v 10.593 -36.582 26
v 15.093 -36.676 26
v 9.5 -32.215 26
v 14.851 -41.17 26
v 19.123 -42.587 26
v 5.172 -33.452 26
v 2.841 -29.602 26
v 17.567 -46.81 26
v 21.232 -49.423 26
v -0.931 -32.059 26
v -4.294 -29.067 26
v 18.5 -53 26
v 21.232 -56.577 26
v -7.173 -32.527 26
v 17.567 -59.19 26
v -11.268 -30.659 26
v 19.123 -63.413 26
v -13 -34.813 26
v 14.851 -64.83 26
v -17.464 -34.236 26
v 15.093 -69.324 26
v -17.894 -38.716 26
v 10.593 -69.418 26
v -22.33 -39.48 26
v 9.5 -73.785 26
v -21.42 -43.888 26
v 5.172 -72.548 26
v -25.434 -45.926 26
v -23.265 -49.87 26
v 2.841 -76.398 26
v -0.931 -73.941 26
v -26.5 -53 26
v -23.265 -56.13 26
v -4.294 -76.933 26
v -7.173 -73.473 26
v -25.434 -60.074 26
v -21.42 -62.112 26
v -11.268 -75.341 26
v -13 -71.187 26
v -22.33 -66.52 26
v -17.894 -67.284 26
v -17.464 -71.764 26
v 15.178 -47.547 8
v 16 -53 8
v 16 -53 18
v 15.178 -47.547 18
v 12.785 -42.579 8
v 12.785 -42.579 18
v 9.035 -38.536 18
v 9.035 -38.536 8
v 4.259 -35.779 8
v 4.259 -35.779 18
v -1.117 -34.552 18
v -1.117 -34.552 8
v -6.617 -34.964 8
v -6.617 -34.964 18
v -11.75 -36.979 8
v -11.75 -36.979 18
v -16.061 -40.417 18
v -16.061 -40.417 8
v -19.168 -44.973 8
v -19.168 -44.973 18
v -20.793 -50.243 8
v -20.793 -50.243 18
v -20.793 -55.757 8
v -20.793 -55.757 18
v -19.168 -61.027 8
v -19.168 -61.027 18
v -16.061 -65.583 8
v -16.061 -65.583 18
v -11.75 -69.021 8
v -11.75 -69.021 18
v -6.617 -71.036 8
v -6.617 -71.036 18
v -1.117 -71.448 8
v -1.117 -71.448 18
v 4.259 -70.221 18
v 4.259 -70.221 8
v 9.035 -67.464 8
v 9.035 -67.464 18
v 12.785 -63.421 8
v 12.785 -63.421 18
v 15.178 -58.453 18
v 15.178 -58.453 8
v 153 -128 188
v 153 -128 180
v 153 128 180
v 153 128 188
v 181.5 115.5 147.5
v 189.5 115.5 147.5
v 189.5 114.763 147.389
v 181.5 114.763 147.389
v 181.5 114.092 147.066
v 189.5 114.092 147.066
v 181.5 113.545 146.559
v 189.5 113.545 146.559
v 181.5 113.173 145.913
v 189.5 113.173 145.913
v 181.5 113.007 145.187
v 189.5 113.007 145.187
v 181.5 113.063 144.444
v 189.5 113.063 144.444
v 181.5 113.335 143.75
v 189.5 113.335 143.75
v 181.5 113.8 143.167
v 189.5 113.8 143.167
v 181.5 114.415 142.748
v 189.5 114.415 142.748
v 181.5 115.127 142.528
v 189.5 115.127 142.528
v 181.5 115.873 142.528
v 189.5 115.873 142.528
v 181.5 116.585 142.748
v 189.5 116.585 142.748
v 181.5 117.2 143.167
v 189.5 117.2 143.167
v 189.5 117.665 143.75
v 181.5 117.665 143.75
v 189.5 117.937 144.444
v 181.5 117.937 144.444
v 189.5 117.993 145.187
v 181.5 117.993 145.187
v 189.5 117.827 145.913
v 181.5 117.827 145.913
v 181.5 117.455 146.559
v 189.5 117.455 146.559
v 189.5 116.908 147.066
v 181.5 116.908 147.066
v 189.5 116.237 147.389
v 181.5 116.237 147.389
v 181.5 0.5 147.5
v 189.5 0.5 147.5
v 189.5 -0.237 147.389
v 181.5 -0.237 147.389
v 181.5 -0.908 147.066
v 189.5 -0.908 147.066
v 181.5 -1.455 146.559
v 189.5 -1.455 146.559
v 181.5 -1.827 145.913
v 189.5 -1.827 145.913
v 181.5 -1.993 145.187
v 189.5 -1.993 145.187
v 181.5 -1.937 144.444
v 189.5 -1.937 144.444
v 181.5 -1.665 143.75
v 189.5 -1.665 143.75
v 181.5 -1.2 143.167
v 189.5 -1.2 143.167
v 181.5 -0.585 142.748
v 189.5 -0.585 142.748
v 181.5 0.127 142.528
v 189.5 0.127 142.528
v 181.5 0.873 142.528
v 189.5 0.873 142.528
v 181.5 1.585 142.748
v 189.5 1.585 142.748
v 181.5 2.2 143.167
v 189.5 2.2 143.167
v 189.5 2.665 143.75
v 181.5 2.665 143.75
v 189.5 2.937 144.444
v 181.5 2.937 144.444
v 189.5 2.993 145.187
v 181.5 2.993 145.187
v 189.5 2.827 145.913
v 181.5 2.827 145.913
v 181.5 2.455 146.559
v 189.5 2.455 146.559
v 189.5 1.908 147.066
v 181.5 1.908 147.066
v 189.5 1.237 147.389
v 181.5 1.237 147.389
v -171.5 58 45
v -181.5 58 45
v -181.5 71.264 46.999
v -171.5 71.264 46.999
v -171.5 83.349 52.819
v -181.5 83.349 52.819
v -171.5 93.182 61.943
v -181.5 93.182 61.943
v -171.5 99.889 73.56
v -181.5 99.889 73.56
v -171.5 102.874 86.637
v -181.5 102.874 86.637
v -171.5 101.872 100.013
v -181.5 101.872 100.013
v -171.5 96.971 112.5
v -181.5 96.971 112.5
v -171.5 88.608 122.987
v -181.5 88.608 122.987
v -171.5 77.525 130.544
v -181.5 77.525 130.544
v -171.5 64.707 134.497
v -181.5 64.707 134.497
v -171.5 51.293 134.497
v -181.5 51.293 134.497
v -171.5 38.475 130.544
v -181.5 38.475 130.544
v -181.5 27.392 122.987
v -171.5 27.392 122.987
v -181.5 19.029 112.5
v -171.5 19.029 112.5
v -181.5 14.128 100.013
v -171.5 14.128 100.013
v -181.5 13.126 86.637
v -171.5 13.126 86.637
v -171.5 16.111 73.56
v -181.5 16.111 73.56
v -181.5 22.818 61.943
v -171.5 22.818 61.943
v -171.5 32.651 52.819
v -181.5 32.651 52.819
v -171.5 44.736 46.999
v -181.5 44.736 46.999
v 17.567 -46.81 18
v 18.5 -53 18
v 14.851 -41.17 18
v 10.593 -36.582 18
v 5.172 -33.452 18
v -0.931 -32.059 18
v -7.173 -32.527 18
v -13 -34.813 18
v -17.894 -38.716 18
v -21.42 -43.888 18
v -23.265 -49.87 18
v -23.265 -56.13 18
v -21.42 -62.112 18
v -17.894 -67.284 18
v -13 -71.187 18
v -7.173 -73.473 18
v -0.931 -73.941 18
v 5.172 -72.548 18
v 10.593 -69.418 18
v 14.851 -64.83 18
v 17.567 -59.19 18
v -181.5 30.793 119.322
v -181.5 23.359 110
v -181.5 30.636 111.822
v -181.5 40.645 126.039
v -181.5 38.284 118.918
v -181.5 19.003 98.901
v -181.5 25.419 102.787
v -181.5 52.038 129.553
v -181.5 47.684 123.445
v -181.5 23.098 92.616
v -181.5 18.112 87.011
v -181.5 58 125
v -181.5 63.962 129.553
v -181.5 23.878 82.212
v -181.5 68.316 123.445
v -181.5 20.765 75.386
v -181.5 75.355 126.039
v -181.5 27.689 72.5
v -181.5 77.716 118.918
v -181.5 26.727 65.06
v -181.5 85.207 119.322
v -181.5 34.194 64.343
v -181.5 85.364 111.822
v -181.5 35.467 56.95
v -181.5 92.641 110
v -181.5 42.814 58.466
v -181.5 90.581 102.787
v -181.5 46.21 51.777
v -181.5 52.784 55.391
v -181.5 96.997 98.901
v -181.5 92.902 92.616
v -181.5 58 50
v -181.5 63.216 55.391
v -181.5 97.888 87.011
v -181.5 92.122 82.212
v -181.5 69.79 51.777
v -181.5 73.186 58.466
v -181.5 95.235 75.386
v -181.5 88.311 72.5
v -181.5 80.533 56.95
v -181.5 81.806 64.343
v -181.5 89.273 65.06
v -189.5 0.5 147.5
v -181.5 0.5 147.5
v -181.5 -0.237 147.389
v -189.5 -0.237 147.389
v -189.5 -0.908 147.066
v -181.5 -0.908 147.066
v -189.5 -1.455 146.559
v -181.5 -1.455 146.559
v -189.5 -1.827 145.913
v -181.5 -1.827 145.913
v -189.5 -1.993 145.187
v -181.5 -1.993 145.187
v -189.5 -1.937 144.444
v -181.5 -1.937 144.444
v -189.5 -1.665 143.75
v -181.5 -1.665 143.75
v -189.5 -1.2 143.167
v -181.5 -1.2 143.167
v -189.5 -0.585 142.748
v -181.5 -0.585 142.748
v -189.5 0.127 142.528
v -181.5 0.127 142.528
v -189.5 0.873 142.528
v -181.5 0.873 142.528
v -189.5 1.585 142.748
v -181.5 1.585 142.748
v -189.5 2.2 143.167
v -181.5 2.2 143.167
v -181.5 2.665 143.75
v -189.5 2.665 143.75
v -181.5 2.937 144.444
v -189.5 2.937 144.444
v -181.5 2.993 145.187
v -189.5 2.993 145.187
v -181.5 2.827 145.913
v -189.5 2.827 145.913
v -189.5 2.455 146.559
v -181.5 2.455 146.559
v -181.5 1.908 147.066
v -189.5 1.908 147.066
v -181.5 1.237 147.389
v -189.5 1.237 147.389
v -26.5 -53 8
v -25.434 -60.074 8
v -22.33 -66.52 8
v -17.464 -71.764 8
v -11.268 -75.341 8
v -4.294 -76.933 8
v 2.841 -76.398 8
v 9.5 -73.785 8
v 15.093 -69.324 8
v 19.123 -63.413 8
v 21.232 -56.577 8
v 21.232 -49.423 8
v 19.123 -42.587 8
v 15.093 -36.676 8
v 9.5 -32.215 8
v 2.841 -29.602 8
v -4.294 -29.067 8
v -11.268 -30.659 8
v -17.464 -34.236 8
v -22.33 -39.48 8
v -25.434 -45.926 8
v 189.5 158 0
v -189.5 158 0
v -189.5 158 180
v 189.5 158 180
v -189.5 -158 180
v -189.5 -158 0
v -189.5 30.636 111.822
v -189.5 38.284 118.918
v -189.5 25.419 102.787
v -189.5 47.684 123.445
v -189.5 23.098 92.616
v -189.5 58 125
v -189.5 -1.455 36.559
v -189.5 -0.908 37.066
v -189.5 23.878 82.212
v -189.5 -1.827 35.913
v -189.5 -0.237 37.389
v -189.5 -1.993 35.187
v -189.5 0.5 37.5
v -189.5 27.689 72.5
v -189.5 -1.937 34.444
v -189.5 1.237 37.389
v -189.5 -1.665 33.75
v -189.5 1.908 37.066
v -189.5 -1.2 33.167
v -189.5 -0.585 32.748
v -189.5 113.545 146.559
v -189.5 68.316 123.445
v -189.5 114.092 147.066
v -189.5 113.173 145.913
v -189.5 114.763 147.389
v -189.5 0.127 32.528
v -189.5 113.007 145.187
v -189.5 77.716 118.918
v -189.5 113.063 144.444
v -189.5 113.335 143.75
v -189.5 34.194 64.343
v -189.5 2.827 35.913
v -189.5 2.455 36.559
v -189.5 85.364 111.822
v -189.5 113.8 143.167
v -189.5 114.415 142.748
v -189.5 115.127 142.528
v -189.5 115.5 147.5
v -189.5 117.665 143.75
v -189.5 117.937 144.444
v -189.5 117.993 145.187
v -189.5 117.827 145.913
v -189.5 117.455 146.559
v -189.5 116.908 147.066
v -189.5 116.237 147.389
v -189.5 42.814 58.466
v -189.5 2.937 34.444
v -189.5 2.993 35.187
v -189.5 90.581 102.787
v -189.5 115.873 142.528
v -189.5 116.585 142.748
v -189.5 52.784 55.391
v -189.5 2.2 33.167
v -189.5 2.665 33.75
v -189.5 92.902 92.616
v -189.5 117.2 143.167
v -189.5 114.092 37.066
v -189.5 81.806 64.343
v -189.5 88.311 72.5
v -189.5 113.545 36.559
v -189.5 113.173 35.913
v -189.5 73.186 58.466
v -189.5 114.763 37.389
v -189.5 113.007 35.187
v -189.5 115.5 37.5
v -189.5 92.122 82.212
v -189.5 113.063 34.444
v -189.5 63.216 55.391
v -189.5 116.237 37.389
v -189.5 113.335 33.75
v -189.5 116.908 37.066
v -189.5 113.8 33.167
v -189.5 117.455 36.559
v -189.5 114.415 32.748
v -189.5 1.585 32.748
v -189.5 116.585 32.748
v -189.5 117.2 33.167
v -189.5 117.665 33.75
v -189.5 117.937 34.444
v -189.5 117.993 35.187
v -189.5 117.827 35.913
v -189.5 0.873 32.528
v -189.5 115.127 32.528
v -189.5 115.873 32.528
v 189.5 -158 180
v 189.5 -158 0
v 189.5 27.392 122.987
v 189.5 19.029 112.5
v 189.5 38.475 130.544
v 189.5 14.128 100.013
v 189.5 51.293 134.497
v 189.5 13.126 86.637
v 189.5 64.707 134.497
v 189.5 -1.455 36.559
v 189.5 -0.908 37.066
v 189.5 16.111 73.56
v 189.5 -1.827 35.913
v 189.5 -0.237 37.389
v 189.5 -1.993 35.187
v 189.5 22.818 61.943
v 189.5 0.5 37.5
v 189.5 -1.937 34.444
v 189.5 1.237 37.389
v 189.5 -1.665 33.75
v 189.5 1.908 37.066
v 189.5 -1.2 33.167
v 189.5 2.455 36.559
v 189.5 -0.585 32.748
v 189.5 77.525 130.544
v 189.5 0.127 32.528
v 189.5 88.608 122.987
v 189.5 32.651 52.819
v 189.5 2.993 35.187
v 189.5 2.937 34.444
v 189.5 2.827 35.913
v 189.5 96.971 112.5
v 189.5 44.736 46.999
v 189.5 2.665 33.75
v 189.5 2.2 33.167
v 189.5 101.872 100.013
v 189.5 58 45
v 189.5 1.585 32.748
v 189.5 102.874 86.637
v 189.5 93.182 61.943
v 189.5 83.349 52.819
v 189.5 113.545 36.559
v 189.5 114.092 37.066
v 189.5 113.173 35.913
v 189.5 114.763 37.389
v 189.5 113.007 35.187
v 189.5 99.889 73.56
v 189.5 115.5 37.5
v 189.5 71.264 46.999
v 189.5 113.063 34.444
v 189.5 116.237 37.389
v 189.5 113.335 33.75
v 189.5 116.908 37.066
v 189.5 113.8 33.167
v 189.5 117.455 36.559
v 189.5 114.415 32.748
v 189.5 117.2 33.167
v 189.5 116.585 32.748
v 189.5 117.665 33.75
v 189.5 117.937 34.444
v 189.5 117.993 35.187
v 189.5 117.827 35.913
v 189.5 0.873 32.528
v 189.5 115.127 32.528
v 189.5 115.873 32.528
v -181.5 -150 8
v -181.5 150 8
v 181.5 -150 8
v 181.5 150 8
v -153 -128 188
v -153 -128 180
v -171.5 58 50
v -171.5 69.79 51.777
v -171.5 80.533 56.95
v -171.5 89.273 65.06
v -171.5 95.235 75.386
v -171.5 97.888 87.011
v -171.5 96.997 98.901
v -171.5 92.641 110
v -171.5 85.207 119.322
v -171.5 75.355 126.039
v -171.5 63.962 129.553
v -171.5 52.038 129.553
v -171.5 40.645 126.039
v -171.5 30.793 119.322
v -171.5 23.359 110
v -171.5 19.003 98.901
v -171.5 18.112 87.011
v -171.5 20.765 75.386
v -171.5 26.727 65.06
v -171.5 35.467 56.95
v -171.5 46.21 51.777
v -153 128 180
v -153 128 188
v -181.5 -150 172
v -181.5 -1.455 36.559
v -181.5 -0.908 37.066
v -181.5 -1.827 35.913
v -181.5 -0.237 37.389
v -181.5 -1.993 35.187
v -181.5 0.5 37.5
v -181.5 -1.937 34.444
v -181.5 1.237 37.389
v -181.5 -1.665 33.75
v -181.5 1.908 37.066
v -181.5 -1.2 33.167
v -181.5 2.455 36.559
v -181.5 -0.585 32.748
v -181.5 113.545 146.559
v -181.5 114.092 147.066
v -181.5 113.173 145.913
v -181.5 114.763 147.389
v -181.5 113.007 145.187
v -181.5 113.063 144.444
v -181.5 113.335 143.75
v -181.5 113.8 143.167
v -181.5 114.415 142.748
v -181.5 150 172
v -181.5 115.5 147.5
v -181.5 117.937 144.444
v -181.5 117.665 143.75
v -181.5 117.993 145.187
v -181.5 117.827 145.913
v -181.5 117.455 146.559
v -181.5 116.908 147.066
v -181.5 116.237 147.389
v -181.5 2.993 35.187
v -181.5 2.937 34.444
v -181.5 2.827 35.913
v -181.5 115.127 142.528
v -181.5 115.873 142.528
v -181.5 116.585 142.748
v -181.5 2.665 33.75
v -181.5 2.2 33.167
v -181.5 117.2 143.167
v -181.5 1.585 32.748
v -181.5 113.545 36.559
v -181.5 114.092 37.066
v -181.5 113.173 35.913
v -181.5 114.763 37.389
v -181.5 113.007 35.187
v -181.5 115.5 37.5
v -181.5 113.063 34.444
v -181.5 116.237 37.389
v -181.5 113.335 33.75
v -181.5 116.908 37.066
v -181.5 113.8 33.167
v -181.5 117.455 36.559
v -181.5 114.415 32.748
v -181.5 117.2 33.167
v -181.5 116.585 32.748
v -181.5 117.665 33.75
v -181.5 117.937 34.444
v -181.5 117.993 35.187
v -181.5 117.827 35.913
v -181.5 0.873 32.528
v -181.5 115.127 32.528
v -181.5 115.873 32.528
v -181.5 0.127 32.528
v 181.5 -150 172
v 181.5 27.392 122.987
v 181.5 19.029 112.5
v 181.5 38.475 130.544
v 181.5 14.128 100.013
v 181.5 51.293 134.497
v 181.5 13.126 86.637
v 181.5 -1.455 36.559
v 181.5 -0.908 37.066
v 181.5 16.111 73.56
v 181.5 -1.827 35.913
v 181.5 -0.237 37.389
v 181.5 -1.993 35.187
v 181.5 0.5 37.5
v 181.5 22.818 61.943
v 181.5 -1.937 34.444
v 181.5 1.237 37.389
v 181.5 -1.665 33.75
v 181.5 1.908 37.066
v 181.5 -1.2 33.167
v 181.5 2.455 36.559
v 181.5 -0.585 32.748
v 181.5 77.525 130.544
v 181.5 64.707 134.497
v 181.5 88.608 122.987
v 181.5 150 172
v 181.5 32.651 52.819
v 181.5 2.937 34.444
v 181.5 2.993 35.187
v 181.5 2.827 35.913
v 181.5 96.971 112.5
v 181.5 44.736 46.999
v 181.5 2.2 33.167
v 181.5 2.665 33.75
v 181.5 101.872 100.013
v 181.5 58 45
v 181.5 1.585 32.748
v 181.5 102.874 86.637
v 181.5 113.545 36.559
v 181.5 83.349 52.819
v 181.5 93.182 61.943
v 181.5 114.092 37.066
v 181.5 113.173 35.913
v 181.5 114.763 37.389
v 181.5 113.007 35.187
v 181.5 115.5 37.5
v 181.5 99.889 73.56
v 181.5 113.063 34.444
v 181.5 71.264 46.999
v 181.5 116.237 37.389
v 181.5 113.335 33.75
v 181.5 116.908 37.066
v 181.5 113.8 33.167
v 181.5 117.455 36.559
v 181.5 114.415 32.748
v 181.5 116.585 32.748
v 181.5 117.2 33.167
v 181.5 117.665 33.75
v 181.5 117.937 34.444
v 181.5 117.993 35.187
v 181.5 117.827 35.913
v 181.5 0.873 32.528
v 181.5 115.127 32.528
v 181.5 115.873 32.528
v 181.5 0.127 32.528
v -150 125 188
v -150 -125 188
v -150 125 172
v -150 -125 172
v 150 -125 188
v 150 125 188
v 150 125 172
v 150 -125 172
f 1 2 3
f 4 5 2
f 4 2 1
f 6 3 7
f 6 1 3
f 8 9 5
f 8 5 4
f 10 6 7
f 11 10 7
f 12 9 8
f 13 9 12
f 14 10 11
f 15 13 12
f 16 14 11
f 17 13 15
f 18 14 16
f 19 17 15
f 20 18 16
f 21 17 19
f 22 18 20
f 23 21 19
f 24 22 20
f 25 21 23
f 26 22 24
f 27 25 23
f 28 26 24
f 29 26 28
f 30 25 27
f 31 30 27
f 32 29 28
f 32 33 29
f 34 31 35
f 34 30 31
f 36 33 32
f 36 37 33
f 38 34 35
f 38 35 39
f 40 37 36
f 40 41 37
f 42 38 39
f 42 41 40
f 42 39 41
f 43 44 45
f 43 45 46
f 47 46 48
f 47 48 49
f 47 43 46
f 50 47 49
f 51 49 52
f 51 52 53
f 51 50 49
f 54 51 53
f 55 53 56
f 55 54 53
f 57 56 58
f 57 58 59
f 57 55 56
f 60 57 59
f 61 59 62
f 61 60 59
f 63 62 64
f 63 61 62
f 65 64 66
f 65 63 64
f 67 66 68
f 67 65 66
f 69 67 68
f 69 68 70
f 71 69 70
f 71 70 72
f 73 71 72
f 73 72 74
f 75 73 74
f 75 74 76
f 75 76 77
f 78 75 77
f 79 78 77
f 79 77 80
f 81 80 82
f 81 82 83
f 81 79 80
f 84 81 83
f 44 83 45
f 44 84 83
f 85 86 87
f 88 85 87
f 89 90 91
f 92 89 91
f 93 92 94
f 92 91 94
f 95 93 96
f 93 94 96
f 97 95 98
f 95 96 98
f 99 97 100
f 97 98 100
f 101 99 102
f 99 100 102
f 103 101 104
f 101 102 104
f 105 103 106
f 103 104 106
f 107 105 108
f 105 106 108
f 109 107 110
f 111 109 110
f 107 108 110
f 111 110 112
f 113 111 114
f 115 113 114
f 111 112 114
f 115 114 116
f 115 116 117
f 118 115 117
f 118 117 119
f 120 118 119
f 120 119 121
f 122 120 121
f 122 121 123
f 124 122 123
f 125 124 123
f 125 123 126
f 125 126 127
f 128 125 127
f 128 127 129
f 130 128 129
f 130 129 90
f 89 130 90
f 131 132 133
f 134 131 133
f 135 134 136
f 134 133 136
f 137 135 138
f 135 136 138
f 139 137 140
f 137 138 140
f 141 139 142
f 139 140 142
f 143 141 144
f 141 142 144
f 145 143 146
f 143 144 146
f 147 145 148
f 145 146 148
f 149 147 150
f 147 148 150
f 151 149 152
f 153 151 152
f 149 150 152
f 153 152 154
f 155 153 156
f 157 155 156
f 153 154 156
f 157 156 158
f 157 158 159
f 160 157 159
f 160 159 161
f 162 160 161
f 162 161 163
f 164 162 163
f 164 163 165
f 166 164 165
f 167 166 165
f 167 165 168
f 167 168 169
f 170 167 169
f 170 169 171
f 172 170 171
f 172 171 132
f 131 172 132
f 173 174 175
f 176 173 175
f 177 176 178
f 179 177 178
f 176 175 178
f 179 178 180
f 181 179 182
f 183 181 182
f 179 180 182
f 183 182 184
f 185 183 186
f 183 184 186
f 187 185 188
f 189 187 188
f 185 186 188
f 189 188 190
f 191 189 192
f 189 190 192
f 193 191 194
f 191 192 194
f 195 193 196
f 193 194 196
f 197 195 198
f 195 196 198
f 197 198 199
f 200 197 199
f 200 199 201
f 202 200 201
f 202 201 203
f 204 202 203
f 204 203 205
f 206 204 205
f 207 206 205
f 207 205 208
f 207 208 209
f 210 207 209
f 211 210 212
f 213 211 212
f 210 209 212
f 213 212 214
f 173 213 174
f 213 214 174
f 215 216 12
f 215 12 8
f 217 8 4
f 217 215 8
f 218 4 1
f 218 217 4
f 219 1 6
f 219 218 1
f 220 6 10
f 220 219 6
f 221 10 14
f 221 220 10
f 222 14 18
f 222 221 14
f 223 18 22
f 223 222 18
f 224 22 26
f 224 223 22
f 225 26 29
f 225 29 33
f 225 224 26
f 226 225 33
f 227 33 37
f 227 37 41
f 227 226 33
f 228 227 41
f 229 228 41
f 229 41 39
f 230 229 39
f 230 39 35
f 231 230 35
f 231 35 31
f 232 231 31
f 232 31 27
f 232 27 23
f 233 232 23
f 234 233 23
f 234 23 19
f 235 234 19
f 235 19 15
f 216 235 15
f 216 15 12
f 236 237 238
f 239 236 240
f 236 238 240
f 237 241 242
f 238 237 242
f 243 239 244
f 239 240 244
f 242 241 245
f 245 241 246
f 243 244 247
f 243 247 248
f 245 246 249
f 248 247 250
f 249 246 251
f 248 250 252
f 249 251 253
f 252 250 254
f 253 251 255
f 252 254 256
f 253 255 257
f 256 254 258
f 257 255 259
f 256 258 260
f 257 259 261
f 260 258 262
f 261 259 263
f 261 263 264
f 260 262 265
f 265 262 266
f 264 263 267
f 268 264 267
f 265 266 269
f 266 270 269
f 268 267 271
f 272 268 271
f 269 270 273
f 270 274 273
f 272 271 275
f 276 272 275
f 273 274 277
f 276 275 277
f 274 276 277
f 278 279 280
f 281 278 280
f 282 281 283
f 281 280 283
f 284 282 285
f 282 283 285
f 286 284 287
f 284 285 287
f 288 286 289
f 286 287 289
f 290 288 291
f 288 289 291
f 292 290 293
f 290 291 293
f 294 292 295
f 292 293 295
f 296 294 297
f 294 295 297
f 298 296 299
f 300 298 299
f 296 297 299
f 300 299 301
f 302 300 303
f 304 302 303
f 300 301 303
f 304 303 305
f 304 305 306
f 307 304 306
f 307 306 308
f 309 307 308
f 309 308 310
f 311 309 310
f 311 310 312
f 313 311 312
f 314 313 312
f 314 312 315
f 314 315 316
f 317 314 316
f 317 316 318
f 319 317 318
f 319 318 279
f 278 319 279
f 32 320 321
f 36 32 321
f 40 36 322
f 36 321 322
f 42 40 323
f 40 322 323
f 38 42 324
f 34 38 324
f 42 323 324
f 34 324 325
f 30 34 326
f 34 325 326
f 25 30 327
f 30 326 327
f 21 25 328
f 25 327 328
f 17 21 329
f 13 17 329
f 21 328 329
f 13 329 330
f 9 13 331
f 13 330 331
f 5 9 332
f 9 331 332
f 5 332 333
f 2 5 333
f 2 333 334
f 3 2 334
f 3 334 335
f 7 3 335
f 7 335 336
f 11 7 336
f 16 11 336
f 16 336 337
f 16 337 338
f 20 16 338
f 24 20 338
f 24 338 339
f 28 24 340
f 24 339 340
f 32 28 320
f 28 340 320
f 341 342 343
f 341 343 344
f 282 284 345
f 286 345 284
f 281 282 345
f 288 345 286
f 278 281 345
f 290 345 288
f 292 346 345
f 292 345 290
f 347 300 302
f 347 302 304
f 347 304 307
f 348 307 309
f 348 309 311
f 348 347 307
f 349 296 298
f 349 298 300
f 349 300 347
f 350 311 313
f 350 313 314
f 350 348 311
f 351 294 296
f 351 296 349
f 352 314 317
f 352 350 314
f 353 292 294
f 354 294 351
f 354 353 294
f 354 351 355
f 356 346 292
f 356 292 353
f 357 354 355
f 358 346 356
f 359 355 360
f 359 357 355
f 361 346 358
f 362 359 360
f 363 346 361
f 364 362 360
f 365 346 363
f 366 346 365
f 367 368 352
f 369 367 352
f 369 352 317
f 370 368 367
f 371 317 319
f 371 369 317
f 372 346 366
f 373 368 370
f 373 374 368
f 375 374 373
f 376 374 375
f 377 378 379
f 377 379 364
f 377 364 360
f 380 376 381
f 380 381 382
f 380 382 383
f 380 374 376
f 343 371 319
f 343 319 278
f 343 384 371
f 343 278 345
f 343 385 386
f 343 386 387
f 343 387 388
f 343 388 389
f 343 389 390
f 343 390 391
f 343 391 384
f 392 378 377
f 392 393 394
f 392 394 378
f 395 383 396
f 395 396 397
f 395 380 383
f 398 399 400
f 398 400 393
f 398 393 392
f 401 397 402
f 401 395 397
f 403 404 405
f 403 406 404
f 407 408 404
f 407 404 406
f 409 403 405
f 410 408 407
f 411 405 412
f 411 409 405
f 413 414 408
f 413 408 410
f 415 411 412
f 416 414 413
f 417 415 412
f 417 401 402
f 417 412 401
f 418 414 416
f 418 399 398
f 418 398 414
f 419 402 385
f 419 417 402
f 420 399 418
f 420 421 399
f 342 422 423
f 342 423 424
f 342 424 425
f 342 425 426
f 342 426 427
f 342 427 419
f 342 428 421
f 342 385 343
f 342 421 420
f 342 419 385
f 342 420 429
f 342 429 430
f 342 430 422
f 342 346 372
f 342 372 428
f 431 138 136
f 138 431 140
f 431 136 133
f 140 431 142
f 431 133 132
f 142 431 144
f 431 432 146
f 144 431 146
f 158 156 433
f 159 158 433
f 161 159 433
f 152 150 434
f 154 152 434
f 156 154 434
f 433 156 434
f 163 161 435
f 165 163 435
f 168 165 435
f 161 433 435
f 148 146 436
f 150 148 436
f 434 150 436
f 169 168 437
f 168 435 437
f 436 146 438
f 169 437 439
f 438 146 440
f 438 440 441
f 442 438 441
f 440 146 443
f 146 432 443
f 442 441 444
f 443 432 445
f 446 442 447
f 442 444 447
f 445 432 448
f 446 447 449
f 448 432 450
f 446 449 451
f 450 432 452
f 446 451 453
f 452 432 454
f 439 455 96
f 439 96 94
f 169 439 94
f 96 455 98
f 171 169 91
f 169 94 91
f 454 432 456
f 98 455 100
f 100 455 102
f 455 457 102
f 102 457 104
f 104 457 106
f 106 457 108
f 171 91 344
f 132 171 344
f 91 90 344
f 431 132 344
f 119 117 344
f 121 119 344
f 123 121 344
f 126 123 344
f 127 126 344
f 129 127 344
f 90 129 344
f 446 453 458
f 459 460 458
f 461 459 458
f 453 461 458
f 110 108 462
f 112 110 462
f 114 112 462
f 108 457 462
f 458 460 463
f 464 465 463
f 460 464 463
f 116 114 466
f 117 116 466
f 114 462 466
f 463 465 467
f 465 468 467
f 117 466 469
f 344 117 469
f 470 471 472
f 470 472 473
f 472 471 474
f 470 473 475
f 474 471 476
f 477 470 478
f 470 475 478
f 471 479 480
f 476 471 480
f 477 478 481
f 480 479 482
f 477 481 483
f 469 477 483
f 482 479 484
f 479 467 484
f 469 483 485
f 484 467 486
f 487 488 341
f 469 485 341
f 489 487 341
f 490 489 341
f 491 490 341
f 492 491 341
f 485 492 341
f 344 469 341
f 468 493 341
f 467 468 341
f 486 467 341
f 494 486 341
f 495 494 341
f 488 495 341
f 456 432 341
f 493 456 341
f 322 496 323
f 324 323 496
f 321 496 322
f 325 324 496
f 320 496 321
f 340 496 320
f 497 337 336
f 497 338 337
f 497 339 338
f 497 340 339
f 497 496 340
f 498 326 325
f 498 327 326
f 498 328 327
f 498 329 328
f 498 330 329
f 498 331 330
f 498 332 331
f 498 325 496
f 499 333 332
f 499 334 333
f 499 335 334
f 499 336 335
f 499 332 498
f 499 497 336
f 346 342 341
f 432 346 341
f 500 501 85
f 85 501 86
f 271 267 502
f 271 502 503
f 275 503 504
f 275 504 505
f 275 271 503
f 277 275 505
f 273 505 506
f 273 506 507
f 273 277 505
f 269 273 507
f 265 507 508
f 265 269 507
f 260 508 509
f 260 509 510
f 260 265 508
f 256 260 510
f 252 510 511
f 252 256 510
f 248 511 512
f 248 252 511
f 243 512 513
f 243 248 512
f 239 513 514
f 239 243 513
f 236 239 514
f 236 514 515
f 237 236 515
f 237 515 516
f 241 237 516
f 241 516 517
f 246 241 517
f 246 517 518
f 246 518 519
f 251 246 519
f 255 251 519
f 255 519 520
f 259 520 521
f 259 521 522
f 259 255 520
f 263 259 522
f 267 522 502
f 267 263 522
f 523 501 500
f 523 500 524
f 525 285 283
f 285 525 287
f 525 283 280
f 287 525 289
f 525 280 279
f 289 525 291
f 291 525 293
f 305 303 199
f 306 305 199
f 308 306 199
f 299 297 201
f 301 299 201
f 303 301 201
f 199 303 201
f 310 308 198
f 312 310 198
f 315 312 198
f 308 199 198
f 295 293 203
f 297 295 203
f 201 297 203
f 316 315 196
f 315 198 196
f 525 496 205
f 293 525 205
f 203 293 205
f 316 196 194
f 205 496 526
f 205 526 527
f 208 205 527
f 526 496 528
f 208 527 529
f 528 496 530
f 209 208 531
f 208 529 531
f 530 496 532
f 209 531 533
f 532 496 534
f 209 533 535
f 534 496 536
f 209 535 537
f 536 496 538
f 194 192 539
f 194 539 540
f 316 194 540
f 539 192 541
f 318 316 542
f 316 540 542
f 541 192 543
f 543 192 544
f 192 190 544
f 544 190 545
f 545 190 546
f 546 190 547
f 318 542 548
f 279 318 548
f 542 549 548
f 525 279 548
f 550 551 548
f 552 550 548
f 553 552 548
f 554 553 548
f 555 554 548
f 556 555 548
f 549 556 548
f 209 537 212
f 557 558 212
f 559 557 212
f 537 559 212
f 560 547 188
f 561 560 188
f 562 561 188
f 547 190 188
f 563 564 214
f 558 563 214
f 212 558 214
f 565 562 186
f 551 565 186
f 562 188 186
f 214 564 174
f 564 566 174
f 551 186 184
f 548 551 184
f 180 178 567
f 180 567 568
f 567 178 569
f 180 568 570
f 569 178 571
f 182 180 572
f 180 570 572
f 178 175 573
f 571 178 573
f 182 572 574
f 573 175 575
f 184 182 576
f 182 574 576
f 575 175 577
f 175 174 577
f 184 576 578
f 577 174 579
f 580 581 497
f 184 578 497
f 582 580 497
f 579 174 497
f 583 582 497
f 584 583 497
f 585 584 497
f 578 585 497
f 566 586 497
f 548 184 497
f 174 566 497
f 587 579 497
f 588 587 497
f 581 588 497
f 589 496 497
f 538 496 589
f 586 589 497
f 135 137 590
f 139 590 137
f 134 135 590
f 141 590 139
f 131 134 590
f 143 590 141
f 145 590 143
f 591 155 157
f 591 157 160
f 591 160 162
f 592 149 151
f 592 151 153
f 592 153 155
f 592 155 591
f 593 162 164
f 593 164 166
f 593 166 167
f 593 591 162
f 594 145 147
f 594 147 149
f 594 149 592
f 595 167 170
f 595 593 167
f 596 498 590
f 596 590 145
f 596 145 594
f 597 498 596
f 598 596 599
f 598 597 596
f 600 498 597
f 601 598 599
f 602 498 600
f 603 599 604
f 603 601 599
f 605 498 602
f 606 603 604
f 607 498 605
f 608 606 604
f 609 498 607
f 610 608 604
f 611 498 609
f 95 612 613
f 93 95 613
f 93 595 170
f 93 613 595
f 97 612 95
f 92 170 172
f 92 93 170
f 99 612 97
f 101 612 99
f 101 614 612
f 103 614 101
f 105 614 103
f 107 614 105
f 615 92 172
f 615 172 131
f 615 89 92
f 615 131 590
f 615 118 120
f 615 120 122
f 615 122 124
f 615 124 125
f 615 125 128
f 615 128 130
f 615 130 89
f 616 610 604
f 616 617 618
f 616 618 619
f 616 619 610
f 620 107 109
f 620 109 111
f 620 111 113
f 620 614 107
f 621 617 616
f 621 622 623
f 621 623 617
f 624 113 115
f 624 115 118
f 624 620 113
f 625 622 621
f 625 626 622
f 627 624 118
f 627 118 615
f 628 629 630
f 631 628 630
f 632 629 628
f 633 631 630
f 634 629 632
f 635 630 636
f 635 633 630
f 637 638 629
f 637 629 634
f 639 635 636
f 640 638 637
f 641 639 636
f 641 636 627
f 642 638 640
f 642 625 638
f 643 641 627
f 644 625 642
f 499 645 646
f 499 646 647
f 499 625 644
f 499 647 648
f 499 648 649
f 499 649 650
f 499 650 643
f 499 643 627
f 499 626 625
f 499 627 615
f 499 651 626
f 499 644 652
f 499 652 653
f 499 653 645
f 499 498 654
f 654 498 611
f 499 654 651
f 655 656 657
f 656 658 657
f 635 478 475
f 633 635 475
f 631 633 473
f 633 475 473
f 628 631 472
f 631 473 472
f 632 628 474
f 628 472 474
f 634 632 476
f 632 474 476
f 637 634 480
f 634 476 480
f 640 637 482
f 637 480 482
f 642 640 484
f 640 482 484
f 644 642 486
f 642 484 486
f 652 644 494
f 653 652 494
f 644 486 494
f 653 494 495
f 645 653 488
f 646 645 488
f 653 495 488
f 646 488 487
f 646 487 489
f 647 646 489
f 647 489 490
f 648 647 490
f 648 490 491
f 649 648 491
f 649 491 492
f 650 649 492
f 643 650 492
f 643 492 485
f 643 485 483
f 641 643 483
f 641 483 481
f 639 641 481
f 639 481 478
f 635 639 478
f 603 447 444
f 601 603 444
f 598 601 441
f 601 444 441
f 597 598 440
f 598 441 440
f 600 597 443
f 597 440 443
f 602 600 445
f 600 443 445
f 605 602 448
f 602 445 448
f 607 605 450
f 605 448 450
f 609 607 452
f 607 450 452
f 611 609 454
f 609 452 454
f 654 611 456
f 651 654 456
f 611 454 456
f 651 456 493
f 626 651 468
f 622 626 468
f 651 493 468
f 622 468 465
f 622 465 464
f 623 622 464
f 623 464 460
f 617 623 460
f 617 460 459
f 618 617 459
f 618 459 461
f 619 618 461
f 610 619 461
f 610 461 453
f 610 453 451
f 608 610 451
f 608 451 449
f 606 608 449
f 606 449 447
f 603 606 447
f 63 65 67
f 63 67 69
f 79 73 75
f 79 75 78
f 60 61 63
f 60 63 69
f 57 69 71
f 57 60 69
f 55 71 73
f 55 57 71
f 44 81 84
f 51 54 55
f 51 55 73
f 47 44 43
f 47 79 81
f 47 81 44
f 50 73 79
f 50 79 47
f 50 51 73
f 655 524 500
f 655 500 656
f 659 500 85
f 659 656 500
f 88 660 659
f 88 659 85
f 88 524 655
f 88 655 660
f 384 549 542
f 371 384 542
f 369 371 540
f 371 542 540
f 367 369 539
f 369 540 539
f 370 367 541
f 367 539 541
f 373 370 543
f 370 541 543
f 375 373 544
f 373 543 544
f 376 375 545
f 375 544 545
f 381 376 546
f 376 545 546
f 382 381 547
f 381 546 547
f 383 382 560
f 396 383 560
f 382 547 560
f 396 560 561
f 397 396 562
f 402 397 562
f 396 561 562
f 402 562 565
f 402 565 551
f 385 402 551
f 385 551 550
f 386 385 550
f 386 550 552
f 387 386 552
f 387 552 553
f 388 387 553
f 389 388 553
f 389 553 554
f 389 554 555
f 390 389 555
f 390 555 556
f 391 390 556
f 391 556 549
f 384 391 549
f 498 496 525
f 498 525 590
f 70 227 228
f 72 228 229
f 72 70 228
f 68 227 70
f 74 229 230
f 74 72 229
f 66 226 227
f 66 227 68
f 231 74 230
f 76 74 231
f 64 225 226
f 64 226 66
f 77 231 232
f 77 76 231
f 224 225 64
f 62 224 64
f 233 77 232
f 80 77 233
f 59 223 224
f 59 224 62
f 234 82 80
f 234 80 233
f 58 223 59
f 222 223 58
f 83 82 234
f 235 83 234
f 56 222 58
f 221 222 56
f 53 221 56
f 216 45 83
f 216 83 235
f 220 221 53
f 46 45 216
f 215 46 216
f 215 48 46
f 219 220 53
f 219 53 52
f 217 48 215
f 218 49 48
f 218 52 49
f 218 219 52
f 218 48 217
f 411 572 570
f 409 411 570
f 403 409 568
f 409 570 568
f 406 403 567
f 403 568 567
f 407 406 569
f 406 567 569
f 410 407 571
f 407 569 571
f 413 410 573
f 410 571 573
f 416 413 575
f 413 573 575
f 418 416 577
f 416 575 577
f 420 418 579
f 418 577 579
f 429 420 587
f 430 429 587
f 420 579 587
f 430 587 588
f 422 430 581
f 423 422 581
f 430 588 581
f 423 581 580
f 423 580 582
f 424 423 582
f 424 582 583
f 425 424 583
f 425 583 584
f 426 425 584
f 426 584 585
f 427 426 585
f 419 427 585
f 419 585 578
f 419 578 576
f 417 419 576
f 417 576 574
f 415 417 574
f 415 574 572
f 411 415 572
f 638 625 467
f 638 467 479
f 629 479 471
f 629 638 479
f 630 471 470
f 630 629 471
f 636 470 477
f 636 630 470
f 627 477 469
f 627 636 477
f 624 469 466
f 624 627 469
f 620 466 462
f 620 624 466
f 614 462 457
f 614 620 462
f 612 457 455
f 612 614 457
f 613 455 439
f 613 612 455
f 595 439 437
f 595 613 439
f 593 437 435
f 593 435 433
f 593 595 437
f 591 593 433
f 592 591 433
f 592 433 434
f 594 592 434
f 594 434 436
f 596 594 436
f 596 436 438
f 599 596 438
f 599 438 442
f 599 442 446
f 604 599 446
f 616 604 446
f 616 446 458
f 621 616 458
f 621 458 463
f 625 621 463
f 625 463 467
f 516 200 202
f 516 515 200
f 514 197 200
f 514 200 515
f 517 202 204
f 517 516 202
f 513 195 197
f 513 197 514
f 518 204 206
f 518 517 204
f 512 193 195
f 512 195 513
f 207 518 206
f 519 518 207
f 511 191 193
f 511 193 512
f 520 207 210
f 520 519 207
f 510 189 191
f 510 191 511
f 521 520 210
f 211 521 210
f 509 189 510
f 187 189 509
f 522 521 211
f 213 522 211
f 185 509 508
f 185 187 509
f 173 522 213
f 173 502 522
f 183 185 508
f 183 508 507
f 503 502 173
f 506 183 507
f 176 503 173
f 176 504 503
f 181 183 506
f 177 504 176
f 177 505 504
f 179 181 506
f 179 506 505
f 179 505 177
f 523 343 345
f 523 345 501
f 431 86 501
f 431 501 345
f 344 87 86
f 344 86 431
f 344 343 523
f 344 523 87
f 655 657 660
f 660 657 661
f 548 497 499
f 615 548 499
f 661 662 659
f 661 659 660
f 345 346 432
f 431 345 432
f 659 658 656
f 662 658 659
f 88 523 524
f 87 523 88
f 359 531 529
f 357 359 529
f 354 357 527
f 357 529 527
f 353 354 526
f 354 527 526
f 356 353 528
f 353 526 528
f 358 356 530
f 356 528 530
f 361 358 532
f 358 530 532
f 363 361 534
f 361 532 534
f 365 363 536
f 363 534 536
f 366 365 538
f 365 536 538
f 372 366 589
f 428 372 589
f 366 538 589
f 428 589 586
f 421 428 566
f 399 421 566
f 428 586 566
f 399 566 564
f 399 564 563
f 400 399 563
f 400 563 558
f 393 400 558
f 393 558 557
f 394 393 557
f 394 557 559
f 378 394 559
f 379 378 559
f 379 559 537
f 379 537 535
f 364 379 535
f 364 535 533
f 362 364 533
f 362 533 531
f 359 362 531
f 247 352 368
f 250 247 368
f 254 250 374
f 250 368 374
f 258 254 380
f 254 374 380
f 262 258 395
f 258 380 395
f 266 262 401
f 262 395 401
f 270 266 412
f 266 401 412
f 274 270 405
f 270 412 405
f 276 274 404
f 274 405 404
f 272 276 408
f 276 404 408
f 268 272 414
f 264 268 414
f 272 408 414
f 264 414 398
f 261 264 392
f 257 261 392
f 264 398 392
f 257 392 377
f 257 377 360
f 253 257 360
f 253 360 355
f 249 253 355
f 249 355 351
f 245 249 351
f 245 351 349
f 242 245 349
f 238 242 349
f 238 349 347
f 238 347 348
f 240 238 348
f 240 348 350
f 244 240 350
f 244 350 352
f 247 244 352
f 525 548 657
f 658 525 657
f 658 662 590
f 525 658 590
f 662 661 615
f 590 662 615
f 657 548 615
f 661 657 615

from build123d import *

# Parameters (mm, degrees)
CROQUIS1_W               = 379
CROQUIS1_H               = 316
SALIENTE_EXTRUIR1_DEPTH  = 180
VACIADO1_T               = -8
CROQUIS2_R               = 35
CORTAR_EXTRUIR4_DEPTH    = 20
CROQUIS4_R               = 45
CROQUIS4_R_2             = 40
SALIENTE_EXTRUIR4_DEPTH  = 10
CORTAR_EXTRUIR6_START    = -10
CROQUIS6_R               = 45
CORTAR_EXTRUIR6_DEPTH    = 10
CROQUIS7_R               = 24
CROQUIS7_R_2             = 21
SALIENTE_EXTRUIR9_DEPTH  = 18
CROQUIS11_W              = 363
CROQUIS11_H              = 300
CROQUIS11_W_2            = 300
CROQUIS11_H_2            = 250
SALIENTE_EXTRUIR10_DEPTH = 8
CROQUIS12_W              = 306
CROQUIS12_H              = 256
CROQUIS12_W_2            = 300
CROQUIS12_H_2            = 250
SALIENTE_EXTRUIR11_DEPTH = 8
CROQUIS20_R              = 21
CROQUIS20_R_2            = 18.5
SALIENTE_EXTRUIR19_DEPTH = 10
TALADRO_ROSCADO_M63_D    = 5


with BuildPart() as part:
    # Croquis1 → Saliente-Extruir1 (new body)
    with BuildSketch(Plane.XY):
        Rectangle(CROQUIS1_W, CROQUIS1_H)
    extrude(amount=SALIENTE_EXTRUIR1_DEPTH)

    # Vaciado1
    vaciado1_openings = [part.faces().sort_by_distance(p)[0] for p in [
        (0, 0, 180),
    ]]
    offset(amount=VACIADO1_T, openings=vaciado1_openings, kind=Kind.INTERSECTION)

    # Croquis2 → Cortar-Extruir4 (cut)
    with BuildSketch(Plane.ZY.offset(189.5)):
        with Locations((90, 58)):
            Circle(CROQUIS2_R)
    extrude(amount=-CORTAR_EXTRUIR4_DEPTH, mode=Mode.SUBTRACT)

    # Croquis4 → Saliente-Extruir4 (add)
    with BuildSketch(Plane(origin=(-181.5, 0, 0), x_dir=(0, 0, -1), z_dir=(1, 0, 0))):
        with Locations((-90, 58)):
            Circle(CROQUIS4_R)
        with Locations((-90, 58)):
            Circle(CROQUIS4_R_2, mode=Mode.SUBTRACT)
    extrude(amount=SALIENTE_EXTRUIR4_DEPTH)

    # Croquis6 → Cortar-Extruir6 (cut)
    with BuildSketch(Plane(origin=(189.5, 0, 0), x_dir=(0, 0, -1), z_dir=(1, 0, 0)).offset(CORTAR_EXTRUIR6_START)):
        with Locations((-90, 58)):
            Circle(CROQUIS6_R)
    extrude(amount=CORTAR_EXTRUIR6_DEPTH, mode=Mode.SUBTRACT)

    # Croquis7 → Saliente-Extruir9 (add)
    with BuildSketch(Plane.XY.offset(8)):
        with Locations(Location((-2.5, -53, 0), (0, 0, 180))):
            Circle(CROQUIS7_R)
        with Locations((-2.5, -53)):
            Circle(CROQUIS7_R_2, mode=Mode.SUBTRACT)
    extrude(amount=SALIENTE_EXTRUIR9_DEPTH)

    # Croquis11 → Saliente-Extruir10 (add)
    with BuildSketch(Plane.XY.offset(180)):
        Rectangle(CROQUIS11_W, CROQUIS11_H)
        Rectangle(CROQUIS11_W_2, CROQUIS11_H_2, mode=Mode.SUBTRACT)
    extrude(amount=-SALIENTE_EXTRUIR10_DEPTH)

    # Croquis12 → Saliente-Extruir11 (add)
    with BuildSketch(Plane.XY.offset(180)):
        Rectangle(CROQUIS12_W, CROQUIS12_H)
        Rectangle(CROQUIS12_W_2, CROQUIS12_H_2, mode=Mode.SUBTRACT)
    extrude(amount=SALIENTE_EXTRUIR11_DEPTH)

    # Croquis20 → Saliente-Extruir19 (add)
    with BuildSketch(Plane.XY.offset(8)):
        with Locations((-2.5, -53)):
            Circle(CROQUIS20_R)
        with Locations((-2.5, -53)):
            Circle(CROQUIS20_R_2, mode=Mode.SUBTRACT)
    extrude(amount=SALIENTE_EXTRUIR19_DEPTH)

    # Taladro roscado M63 (through all)
    with Locations(Plane(origin=(-189.5, 115.5, 35), x_dir=(0, 0, -1), z_dir=(-1, 0, 0))):
        with Locations((0, 0), (-110, 0), (-110, 115), (0, 115)):
            Hole(TALADRO_ROSCADO_M63_D / 2)


solid = part.part
